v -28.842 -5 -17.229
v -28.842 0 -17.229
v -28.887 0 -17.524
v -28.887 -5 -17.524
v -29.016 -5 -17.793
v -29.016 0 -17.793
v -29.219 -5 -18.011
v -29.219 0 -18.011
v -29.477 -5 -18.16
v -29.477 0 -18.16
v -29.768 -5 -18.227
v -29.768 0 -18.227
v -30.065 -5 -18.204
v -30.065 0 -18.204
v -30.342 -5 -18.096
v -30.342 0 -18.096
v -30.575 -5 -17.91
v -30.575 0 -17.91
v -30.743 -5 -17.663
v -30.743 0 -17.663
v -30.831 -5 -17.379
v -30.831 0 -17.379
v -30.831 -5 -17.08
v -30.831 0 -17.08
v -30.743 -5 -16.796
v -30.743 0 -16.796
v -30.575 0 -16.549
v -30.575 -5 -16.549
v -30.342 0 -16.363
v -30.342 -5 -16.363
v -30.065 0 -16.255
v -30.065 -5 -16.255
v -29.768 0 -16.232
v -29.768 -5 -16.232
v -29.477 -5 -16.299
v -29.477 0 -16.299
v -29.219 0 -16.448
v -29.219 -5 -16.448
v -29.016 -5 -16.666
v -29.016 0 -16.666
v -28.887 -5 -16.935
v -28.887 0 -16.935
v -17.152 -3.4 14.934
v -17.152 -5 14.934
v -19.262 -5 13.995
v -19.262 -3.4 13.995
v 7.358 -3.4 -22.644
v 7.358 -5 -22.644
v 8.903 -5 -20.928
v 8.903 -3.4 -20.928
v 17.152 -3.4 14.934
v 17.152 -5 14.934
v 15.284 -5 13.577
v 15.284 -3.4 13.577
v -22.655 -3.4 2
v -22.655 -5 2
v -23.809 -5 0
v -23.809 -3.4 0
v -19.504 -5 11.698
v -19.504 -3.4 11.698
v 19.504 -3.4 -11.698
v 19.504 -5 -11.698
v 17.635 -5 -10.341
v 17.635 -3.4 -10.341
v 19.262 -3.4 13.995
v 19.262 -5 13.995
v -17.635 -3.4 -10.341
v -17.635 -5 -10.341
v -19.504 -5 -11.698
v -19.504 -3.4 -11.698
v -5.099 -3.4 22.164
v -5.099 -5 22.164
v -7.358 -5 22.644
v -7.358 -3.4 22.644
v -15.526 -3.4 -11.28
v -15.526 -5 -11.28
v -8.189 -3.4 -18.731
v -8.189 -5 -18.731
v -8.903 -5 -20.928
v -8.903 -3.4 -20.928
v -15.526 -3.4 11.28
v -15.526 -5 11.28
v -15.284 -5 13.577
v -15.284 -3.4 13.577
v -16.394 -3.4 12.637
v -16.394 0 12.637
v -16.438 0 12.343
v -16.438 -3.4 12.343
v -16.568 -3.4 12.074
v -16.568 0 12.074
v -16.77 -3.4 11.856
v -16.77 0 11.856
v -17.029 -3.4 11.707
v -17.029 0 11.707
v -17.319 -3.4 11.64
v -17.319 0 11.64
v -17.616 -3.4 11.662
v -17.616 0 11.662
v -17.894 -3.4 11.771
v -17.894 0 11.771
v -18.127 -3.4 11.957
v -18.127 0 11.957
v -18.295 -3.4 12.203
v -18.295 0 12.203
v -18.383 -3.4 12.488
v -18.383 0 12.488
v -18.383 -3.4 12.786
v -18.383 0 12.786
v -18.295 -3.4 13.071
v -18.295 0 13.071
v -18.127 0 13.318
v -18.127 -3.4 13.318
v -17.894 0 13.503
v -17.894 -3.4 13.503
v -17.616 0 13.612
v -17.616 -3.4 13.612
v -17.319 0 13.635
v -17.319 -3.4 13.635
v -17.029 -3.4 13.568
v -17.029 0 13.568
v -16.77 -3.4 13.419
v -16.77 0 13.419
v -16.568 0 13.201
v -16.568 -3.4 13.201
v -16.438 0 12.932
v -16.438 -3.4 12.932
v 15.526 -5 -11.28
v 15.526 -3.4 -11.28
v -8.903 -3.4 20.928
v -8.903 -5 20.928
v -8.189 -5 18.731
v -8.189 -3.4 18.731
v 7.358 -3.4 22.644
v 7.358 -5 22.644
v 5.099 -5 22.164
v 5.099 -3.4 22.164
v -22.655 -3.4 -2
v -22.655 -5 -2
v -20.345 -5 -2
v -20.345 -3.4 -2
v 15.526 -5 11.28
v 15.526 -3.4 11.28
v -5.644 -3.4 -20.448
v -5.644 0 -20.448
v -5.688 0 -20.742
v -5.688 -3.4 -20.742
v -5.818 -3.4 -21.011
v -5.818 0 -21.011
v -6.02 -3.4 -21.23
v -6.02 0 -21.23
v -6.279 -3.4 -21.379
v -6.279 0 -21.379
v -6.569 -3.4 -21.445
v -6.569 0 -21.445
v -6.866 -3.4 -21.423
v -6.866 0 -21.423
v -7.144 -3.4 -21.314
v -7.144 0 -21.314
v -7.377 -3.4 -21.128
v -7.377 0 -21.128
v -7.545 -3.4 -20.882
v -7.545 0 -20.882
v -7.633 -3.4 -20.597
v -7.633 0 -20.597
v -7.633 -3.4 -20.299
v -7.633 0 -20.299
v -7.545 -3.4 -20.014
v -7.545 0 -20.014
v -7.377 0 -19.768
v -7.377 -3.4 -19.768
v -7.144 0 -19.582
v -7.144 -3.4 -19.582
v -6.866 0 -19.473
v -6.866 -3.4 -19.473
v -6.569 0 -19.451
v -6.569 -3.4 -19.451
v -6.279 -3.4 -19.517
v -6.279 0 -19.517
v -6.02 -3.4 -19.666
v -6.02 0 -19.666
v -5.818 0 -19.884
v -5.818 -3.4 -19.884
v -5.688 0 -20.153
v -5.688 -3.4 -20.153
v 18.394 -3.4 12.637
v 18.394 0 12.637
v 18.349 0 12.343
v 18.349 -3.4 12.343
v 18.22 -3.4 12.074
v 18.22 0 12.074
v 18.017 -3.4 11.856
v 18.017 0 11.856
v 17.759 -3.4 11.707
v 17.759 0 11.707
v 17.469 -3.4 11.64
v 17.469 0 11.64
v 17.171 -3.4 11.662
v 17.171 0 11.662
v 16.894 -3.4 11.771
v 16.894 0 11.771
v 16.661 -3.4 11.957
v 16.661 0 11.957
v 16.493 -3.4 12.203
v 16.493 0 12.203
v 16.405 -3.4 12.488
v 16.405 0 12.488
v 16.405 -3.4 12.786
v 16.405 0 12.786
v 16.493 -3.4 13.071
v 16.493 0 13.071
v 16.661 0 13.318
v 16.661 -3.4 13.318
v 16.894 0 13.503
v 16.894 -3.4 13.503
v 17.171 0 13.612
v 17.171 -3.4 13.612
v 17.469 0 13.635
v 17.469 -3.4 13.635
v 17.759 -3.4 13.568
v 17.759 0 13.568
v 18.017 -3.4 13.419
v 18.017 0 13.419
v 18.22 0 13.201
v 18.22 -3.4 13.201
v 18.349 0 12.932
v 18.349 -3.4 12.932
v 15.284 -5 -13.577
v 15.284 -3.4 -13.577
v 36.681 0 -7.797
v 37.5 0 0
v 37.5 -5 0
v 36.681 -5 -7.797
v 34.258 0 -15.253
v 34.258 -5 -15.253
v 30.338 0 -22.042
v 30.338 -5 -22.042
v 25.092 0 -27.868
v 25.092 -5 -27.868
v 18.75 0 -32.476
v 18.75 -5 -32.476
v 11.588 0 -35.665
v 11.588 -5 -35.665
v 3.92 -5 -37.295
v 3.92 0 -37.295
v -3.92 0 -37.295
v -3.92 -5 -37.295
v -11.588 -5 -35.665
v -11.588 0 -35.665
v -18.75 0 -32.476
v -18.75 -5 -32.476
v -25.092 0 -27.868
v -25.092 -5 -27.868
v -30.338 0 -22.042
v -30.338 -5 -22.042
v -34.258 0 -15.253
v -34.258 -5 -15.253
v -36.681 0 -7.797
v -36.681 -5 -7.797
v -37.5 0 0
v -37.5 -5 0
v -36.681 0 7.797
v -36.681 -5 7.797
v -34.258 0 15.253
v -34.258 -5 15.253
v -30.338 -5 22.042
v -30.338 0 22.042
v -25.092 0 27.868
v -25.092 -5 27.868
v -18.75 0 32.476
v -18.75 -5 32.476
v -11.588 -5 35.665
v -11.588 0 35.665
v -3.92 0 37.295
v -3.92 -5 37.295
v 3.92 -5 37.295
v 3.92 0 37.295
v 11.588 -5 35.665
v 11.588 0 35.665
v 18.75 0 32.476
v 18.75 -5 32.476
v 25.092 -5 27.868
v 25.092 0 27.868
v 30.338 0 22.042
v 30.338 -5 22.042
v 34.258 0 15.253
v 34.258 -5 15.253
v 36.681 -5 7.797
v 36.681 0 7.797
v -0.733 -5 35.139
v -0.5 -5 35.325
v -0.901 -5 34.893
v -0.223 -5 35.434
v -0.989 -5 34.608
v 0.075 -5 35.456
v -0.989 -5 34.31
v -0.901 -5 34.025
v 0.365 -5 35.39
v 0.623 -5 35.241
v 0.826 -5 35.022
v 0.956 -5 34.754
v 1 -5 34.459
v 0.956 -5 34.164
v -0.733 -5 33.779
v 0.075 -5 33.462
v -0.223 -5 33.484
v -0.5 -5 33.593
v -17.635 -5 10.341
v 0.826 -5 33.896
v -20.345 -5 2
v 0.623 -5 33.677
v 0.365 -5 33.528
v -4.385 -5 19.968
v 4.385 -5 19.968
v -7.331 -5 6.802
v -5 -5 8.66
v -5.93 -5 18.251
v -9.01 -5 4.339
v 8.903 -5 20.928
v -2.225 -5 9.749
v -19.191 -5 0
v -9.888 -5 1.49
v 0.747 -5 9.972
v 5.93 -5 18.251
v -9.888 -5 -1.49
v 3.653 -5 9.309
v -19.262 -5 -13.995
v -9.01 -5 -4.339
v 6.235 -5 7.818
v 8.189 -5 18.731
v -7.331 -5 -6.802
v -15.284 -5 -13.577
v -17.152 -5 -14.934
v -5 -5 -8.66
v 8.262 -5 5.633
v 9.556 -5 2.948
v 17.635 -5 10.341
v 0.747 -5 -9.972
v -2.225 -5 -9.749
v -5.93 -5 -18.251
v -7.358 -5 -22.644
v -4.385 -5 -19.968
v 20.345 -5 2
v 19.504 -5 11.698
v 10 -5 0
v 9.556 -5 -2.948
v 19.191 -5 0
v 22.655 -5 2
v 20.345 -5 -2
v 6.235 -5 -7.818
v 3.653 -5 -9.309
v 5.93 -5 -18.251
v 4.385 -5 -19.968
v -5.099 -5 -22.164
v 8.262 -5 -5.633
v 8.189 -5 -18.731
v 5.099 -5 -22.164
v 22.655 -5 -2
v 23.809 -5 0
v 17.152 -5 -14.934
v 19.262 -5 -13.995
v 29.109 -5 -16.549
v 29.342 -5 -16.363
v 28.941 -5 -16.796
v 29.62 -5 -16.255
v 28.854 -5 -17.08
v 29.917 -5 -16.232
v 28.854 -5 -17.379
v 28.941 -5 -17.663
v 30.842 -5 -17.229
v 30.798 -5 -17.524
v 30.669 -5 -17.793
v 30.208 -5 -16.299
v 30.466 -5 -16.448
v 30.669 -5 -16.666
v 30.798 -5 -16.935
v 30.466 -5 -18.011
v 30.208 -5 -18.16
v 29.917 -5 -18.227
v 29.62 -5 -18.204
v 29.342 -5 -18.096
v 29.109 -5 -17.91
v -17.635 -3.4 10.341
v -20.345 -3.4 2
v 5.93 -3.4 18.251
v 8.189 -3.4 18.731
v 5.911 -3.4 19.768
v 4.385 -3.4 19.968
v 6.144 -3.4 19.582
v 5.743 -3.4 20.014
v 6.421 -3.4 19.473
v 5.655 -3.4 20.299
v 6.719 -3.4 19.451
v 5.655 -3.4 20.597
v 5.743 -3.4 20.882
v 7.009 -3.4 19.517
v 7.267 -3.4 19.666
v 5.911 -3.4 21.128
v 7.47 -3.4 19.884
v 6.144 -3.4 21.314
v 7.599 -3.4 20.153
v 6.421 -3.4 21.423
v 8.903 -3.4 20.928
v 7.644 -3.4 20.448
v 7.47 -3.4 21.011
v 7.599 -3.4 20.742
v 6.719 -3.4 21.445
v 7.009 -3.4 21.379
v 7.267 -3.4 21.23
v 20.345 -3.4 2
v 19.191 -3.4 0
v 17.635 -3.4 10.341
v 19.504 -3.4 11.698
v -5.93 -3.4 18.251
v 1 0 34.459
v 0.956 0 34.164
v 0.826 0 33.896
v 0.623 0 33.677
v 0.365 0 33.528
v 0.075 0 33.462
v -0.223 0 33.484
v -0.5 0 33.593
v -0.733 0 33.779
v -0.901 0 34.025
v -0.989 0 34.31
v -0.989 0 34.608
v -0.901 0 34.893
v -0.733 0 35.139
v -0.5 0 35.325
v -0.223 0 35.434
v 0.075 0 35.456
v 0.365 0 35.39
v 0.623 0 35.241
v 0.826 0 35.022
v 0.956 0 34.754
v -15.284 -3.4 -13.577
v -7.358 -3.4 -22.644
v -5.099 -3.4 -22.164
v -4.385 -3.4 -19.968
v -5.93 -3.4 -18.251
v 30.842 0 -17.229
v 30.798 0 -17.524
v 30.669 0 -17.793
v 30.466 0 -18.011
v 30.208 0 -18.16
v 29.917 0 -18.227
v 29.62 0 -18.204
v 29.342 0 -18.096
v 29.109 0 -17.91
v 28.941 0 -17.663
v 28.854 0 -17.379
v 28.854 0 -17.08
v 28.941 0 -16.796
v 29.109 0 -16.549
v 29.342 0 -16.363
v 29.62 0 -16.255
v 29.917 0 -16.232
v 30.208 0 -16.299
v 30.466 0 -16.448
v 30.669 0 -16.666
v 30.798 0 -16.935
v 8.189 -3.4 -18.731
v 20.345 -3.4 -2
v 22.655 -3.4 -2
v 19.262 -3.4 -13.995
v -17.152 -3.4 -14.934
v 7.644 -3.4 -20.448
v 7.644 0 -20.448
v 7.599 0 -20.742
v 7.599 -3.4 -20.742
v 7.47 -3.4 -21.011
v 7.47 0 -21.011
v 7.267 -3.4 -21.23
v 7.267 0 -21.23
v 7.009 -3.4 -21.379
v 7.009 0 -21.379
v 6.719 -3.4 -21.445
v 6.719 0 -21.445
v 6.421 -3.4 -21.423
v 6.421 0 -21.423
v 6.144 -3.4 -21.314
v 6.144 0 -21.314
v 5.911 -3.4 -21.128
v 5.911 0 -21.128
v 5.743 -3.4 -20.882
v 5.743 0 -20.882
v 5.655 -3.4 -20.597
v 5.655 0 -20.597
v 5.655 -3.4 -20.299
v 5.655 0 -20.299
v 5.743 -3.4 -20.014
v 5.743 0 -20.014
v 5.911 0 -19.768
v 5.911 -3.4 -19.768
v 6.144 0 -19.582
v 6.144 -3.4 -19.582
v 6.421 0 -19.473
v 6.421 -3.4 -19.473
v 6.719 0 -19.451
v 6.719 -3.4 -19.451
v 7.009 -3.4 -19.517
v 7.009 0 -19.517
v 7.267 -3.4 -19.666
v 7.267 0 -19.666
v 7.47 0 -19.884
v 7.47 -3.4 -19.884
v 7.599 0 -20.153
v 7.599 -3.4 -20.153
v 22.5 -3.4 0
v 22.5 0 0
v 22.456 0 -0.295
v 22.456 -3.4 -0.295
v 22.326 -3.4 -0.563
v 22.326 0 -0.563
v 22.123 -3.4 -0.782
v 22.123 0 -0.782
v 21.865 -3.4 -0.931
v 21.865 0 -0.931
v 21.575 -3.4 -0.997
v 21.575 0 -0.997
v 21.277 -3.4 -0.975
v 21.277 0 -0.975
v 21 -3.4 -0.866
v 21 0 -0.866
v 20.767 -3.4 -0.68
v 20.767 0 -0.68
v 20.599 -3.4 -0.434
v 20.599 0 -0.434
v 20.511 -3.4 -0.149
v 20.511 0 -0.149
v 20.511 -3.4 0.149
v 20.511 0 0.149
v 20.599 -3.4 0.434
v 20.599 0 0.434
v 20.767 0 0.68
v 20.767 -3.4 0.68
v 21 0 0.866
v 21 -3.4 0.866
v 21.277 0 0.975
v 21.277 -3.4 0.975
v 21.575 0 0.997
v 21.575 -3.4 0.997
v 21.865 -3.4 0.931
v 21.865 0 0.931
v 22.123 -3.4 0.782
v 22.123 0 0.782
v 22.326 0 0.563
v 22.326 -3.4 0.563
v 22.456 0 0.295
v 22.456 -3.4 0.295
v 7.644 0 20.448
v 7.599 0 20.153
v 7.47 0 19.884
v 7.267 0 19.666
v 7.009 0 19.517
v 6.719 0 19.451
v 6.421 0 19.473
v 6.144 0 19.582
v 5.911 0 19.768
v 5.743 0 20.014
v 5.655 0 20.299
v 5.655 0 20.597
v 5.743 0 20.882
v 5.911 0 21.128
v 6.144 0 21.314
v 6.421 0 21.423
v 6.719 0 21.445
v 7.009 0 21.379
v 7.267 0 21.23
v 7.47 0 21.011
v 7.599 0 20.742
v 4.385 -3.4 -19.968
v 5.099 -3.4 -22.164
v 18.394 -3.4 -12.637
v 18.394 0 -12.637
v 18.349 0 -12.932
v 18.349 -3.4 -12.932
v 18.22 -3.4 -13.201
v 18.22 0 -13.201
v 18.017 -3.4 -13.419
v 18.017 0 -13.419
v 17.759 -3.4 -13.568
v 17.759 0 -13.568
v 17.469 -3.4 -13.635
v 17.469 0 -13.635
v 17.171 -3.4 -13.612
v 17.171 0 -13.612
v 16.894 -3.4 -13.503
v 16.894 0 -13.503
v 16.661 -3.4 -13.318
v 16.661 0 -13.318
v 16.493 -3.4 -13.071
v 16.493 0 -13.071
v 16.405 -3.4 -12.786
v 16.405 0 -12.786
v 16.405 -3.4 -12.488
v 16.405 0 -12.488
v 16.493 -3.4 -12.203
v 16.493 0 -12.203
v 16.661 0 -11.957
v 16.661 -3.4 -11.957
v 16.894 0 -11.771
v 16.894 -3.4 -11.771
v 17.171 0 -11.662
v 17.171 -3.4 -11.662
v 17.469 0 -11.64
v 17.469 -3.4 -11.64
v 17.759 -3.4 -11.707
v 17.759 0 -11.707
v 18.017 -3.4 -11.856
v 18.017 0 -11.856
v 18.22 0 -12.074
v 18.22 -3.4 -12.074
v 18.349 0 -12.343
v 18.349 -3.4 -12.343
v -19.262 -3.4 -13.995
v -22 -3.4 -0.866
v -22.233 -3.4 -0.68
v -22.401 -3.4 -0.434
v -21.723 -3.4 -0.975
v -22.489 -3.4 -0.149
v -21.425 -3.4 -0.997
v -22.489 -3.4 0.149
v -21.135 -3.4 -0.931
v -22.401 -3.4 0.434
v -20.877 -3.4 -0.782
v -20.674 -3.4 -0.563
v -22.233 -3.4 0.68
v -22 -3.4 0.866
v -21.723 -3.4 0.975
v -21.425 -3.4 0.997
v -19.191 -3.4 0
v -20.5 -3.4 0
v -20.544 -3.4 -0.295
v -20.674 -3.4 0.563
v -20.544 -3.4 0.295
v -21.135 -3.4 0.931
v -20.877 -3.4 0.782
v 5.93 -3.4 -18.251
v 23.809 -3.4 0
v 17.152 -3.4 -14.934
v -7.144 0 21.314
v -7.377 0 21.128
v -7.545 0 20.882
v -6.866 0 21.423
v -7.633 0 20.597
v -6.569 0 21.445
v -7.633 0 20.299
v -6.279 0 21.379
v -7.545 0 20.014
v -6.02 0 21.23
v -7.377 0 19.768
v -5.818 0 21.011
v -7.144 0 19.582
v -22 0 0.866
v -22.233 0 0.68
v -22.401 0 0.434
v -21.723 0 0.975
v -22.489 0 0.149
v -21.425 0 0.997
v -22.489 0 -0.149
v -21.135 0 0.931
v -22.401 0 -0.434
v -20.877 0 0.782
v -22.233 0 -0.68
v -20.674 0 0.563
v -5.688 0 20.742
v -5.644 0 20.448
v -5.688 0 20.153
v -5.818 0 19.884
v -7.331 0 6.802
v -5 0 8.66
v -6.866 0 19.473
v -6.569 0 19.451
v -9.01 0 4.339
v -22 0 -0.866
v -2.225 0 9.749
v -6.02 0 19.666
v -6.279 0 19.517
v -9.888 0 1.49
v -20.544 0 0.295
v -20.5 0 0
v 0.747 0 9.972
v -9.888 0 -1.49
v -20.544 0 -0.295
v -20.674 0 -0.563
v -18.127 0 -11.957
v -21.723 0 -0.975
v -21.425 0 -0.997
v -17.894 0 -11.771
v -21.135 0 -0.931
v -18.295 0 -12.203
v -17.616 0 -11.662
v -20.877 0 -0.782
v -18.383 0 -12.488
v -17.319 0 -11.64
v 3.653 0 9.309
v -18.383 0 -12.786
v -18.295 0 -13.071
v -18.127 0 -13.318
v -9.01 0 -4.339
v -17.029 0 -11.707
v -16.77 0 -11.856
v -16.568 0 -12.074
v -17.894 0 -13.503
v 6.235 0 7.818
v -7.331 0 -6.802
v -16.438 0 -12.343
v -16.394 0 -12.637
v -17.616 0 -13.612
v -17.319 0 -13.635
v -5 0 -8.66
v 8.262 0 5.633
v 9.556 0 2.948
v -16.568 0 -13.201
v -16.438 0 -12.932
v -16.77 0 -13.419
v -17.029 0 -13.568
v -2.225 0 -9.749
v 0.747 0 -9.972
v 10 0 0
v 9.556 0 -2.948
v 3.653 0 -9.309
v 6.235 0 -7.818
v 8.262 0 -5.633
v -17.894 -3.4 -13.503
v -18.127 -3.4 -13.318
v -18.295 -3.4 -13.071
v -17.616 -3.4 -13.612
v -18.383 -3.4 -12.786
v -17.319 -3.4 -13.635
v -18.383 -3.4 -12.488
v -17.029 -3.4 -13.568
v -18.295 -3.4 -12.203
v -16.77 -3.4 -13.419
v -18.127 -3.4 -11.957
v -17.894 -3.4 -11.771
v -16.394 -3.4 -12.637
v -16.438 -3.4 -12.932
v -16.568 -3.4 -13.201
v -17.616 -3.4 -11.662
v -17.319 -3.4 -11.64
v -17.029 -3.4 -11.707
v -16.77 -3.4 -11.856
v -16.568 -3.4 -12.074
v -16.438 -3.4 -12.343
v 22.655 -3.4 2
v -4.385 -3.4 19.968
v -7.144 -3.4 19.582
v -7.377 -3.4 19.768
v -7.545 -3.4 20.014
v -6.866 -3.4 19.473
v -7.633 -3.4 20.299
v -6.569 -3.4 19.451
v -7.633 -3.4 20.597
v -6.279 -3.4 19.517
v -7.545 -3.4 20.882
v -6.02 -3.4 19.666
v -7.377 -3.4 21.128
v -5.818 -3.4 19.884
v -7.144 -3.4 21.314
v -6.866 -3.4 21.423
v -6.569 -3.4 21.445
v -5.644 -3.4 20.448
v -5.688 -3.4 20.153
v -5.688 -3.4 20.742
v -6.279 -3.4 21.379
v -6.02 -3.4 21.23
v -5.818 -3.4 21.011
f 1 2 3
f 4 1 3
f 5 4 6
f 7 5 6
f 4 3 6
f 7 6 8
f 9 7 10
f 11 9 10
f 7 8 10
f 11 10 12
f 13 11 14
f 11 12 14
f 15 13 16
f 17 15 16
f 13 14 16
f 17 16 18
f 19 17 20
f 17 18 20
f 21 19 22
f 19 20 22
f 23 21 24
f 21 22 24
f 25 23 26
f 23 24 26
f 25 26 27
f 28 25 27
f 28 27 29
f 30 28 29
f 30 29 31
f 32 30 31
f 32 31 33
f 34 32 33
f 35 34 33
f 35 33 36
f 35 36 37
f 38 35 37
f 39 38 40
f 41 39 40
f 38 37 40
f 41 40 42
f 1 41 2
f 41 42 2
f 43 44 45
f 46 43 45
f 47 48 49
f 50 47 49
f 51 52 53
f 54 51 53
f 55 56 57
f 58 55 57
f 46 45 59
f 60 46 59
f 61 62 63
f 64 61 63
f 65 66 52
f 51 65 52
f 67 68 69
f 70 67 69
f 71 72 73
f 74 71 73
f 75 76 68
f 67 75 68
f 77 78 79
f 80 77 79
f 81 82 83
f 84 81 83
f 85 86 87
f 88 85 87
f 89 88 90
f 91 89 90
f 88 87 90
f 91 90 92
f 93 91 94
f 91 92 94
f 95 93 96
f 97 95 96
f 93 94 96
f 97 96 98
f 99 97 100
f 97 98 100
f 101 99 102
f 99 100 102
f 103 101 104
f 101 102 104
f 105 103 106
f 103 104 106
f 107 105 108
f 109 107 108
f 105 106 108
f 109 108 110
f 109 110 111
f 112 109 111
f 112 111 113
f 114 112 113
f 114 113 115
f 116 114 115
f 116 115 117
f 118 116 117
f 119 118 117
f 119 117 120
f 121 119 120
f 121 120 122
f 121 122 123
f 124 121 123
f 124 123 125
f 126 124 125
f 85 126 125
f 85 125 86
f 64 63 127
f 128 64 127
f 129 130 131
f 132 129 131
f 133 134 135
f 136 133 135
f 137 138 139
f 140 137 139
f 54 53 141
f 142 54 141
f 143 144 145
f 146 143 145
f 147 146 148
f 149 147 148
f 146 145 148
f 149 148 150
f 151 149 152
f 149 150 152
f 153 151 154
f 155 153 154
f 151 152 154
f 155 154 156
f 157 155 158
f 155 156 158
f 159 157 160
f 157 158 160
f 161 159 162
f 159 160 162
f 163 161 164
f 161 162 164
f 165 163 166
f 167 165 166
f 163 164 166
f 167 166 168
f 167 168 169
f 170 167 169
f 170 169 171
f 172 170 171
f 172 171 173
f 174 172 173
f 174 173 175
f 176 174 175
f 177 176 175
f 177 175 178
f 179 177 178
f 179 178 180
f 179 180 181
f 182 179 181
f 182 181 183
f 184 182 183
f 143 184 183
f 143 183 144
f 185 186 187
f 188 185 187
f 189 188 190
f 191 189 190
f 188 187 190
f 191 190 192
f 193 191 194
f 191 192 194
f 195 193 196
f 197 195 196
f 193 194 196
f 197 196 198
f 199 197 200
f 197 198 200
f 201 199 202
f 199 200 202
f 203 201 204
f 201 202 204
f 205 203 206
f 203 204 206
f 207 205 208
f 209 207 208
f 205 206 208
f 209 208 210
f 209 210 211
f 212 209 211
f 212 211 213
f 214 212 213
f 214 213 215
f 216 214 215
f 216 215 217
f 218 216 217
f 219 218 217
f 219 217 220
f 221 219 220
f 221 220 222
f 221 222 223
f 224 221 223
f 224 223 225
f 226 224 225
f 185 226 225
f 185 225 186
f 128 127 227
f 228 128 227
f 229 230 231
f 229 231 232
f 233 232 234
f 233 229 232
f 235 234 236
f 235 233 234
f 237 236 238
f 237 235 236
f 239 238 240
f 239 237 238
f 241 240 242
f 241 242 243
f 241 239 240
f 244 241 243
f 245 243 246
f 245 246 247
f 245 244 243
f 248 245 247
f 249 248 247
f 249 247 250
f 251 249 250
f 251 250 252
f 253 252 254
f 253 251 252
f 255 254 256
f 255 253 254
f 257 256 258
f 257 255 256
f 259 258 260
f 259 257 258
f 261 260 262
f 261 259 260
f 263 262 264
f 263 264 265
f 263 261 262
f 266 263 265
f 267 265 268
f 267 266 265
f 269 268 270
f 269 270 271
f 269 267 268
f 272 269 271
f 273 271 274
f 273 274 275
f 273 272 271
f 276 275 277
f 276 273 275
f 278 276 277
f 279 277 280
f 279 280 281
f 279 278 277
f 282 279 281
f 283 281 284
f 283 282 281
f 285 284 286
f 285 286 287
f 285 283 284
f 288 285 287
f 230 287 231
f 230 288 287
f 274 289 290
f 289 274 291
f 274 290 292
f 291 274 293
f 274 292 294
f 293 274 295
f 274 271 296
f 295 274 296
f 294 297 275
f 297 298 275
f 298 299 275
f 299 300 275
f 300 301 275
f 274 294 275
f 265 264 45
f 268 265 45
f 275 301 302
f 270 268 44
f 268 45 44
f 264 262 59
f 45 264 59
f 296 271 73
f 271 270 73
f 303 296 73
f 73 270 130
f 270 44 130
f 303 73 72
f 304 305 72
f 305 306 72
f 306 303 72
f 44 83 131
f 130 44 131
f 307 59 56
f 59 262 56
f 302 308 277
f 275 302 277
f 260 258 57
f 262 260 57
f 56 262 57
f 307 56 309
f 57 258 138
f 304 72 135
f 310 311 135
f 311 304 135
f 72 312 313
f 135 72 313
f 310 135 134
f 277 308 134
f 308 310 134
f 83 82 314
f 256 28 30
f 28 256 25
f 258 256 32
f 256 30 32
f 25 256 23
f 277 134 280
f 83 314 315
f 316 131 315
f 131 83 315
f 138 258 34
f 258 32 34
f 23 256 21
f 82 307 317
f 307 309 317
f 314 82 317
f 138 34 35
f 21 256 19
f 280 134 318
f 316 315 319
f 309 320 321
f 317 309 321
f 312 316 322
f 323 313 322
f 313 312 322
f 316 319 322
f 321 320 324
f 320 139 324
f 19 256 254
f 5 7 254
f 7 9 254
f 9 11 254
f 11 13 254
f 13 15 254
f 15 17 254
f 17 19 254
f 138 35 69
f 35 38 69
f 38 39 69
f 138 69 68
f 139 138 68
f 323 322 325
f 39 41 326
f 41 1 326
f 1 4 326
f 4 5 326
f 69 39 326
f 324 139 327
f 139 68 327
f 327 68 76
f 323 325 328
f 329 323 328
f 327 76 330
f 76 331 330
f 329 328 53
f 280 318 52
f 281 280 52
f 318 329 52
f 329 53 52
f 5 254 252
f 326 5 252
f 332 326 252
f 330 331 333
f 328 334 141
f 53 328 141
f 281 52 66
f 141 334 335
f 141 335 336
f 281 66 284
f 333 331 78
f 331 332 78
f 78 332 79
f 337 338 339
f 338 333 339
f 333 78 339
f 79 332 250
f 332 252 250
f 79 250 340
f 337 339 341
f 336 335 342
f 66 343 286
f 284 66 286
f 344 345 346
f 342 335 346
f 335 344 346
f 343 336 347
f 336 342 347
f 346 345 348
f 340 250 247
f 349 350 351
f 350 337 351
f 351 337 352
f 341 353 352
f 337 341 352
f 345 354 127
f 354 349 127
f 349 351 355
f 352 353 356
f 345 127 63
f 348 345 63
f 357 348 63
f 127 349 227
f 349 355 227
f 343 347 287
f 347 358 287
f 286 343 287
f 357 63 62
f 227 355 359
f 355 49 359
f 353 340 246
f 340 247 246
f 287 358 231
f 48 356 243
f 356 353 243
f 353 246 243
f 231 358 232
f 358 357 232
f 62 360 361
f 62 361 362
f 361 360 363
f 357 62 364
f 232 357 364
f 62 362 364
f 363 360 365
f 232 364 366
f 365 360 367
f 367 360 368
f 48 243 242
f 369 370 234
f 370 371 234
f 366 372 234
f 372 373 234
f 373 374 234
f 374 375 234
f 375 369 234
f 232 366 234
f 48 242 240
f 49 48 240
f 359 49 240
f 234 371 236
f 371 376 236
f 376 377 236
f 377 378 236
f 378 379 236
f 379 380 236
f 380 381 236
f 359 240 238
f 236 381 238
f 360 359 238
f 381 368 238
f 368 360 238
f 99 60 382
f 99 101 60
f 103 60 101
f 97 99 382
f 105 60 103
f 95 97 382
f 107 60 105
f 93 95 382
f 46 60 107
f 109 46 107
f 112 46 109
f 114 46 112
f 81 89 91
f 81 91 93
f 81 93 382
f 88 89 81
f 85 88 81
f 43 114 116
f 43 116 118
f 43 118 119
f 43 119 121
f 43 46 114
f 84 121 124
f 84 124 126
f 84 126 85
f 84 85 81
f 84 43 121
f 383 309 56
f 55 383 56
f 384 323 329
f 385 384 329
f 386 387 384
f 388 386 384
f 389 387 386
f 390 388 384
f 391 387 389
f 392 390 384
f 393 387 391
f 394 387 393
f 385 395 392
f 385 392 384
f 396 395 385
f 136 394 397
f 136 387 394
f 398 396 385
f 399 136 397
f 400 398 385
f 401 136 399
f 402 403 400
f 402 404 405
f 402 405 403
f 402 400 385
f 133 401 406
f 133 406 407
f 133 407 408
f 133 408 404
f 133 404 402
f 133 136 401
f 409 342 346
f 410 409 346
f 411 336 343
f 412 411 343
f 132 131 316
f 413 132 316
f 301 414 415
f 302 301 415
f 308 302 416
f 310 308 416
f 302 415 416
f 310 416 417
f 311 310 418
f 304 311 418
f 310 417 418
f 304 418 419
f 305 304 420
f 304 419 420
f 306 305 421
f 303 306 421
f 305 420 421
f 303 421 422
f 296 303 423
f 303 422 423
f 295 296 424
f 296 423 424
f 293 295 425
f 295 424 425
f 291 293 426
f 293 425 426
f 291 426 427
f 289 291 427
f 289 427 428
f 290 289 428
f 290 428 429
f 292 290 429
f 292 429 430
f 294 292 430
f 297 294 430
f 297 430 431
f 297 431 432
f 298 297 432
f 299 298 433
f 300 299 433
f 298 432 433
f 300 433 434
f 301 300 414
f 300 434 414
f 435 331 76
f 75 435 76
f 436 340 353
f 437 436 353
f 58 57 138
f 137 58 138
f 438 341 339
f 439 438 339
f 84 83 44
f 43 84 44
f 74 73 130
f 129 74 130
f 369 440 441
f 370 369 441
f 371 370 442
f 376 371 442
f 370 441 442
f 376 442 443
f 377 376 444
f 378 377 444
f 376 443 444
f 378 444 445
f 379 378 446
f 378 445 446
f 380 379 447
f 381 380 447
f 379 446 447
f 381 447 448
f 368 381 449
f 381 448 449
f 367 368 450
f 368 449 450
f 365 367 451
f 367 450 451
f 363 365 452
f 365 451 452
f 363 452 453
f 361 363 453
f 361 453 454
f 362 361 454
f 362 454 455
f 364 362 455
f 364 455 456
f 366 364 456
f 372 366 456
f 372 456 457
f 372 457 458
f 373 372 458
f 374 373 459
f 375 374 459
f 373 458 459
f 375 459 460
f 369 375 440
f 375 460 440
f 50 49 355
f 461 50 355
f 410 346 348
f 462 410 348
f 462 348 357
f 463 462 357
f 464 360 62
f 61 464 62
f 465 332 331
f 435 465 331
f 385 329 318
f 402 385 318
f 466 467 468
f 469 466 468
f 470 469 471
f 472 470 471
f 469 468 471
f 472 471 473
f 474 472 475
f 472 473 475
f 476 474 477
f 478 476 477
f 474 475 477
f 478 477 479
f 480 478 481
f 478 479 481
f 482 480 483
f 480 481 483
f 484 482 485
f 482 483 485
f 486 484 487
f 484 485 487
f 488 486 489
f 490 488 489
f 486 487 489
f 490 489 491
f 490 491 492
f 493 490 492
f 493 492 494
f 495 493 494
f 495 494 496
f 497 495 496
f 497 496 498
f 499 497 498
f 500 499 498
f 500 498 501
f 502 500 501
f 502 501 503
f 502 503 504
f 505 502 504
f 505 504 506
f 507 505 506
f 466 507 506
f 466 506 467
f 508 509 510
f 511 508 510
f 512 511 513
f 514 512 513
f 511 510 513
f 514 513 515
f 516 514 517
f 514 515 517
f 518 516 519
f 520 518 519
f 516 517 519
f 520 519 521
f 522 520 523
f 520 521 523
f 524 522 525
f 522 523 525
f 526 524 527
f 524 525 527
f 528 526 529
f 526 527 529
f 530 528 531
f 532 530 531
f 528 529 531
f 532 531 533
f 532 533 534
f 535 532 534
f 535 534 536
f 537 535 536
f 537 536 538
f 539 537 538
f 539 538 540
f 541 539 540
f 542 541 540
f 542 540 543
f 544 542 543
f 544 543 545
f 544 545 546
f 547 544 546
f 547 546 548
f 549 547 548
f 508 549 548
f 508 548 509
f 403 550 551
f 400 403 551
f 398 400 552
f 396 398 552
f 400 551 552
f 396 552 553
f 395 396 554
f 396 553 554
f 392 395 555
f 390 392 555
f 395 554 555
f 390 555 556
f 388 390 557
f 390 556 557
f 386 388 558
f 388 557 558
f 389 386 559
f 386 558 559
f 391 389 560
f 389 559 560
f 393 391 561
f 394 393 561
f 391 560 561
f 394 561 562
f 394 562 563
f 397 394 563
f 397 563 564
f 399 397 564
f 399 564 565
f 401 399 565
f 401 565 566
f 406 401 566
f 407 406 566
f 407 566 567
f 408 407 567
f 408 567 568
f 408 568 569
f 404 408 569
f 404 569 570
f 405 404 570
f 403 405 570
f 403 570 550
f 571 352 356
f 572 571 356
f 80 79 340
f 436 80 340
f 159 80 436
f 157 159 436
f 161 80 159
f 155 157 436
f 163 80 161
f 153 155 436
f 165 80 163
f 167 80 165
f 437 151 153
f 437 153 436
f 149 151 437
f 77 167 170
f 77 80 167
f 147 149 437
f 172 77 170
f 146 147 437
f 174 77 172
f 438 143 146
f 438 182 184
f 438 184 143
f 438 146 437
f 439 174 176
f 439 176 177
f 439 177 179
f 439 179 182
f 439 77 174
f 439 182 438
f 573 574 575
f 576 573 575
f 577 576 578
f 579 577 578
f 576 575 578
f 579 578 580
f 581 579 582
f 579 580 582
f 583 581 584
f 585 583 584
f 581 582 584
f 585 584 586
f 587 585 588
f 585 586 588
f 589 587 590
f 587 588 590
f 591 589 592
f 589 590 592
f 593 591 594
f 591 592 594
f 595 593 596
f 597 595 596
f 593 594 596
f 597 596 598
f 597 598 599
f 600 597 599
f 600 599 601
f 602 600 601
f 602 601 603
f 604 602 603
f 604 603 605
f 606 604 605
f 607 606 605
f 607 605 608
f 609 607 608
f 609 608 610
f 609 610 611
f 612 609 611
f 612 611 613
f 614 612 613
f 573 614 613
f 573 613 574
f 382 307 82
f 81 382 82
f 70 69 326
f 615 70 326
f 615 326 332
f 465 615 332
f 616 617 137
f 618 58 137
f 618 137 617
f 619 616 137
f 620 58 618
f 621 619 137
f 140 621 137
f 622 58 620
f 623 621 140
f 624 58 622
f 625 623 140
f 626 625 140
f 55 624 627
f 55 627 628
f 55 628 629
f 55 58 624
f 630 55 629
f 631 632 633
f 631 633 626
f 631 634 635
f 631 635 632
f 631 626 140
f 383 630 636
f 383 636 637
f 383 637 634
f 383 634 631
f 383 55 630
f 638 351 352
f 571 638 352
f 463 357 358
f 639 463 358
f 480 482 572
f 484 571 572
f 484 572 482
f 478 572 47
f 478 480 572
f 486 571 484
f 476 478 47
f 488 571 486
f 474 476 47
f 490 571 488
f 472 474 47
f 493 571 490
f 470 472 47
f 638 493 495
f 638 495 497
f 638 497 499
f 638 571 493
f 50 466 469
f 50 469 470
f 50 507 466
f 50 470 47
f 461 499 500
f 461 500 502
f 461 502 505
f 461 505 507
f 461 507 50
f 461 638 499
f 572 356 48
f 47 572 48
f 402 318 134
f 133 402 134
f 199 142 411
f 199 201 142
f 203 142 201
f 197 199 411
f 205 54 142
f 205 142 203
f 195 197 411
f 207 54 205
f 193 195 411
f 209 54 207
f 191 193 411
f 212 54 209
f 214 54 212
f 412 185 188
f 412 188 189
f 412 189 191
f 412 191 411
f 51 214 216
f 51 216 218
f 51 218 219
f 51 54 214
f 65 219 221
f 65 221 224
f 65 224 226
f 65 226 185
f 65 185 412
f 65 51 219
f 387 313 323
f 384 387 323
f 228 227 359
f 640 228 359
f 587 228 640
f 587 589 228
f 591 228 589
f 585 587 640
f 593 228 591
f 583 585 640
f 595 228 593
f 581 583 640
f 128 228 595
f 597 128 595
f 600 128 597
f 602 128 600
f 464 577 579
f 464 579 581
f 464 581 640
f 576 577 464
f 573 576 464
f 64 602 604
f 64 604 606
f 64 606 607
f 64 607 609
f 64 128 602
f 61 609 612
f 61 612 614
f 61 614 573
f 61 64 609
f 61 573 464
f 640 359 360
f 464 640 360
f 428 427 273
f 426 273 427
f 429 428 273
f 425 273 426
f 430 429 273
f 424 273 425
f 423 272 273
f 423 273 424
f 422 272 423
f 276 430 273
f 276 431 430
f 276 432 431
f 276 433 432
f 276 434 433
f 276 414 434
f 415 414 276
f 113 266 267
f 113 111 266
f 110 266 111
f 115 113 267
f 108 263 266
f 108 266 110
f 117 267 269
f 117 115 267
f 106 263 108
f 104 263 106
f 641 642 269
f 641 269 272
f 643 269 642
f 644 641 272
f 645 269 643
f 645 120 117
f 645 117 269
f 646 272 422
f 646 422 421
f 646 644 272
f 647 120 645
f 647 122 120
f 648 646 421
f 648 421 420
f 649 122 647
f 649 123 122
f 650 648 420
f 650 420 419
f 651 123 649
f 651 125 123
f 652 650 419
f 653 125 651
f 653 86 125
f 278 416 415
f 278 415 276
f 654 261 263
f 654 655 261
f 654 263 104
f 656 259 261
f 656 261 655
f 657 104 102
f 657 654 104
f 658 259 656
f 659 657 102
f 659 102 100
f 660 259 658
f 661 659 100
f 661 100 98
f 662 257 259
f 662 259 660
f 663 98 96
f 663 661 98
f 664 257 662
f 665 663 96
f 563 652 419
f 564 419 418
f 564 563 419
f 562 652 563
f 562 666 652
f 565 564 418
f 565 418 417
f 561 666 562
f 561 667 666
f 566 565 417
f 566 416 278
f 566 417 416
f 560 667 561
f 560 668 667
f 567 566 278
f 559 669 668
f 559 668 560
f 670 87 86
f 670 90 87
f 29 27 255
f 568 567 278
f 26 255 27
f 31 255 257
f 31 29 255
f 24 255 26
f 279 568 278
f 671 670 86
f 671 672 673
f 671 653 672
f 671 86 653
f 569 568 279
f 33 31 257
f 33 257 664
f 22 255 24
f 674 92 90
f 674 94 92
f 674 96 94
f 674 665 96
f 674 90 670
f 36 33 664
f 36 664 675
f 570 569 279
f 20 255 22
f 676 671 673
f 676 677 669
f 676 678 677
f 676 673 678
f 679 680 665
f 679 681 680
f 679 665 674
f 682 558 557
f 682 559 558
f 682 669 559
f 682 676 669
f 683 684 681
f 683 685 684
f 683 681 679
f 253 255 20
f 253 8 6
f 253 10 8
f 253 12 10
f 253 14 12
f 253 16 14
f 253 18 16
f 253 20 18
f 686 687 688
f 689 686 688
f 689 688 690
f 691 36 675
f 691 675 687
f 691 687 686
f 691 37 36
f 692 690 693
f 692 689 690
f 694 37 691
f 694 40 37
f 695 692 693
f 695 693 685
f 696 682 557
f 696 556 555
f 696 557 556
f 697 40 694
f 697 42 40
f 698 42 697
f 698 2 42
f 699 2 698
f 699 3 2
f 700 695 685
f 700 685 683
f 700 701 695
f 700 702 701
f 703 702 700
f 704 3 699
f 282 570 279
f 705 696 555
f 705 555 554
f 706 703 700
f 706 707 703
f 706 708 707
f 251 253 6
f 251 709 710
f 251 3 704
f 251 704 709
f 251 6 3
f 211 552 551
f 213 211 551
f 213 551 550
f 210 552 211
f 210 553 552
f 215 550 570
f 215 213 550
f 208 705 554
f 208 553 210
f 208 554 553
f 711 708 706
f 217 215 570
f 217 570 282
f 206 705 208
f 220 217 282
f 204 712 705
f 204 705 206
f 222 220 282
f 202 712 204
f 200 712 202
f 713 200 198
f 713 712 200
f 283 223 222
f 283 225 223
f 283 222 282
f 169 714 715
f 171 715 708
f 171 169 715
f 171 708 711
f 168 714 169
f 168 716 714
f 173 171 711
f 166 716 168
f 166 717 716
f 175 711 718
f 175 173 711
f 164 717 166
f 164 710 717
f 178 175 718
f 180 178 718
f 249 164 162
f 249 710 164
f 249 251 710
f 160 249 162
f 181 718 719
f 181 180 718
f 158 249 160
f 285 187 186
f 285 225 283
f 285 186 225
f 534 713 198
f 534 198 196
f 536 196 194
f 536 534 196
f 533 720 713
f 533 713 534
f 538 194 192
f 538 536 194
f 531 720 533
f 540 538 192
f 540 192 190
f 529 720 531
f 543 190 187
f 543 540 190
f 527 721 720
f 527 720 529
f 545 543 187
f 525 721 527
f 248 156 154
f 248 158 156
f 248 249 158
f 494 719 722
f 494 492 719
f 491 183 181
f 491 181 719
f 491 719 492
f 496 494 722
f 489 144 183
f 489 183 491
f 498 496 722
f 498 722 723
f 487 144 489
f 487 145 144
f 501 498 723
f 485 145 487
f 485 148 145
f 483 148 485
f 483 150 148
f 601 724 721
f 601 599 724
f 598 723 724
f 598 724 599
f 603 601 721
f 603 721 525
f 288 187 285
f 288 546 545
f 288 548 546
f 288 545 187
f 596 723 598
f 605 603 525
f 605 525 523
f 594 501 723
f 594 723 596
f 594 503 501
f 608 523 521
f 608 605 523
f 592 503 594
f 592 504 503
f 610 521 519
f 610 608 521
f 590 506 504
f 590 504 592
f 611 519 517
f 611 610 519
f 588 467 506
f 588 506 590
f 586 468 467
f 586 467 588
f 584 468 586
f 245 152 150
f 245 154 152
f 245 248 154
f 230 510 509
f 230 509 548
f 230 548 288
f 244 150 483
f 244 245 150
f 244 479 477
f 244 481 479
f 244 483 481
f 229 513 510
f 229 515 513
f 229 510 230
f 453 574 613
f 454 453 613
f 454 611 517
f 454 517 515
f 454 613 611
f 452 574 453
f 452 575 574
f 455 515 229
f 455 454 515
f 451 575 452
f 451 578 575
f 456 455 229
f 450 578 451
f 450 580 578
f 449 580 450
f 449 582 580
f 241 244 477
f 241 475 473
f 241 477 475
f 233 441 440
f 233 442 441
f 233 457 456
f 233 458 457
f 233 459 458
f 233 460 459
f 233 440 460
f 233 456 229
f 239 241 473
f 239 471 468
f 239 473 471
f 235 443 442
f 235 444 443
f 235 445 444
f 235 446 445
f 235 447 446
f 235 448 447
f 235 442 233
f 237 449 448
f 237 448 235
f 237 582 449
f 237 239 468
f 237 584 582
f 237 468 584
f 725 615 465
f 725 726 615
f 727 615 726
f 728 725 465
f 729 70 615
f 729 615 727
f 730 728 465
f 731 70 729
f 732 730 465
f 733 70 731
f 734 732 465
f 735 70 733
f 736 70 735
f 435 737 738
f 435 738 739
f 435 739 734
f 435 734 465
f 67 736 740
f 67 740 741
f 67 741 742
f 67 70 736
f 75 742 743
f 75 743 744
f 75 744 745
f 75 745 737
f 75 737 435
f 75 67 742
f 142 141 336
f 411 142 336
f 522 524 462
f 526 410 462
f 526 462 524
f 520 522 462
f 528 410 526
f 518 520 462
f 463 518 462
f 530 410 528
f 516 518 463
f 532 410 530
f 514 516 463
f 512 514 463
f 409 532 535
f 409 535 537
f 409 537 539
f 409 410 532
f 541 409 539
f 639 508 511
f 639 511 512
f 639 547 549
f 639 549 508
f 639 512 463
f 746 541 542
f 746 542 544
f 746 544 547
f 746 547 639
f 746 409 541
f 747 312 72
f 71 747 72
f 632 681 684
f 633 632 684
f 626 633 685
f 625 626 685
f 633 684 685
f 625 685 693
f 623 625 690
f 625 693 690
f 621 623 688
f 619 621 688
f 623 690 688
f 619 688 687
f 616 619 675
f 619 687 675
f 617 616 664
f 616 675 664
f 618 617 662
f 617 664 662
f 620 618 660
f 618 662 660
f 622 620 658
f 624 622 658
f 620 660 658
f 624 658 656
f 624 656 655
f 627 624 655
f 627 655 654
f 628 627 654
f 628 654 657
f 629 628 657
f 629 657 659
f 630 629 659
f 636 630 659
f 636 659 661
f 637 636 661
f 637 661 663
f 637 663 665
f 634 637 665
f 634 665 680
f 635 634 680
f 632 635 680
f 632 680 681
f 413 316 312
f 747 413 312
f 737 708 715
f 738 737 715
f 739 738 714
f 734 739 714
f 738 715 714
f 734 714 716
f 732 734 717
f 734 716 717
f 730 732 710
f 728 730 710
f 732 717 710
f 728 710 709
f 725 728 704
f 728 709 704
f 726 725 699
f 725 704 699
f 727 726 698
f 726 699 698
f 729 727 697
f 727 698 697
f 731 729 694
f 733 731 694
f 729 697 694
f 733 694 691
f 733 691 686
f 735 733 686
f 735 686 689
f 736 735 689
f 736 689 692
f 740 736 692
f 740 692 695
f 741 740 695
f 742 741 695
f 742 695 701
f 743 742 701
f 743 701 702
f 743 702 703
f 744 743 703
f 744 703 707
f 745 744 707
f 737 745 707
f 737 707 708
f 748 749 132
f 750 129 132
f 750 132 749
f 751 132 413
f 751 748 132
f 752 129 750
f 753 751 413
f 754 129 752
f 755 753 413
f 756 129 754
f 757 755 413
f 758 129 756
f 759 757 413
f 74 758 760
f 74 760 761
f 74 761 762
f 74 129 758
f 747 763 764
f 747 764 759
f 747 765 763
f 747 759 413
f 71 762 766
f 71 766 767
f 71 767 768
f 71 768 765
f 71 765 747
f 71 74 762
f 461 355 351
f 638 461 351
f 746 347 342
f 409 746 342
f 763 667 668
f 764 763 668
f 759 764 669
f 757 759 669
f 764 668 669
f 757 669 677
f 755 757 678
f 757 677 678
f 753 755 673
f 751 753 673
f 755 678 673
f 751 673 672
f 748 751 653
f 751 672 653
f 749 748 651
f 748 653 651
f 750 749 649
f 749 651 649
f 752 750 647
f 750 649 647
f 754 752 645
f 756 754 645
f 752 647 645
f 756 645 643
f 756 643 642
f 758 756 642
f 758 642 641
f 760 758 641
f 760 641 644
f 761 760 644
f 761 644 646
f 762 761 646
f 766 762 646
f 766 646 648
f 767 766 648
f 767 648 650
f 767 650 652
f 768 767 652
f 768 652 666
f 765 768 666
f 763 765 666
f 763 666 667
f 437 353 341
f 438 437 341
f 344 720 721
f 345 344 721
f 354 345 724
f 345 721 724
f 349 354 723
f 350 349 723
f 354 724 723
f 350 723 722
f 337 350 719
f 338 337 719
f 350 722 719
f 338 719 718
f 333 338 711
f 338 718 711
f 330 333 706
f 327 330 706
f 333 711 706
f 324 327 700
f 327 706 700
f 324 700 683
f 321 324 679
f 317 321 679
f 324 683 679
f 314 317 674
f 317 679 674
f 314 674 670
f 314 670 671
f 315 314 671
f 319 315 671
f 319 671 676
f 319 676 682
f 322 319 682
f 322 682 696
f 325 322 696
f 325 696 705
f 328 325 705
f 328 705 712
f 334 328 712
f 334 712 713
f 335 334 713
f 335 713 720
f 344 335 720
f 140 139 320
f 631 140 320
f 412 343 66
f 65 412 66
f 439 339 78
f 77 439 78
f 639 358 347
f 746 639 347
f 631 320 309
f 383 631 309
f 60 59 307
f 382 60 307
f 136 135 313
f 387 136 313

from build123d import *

# Parameters (mm, degrees)
SKETCH1_R           = 37.5
BOSS_EXTRUDE1_DEPTH = 5
CUT_EXTRUDE1_REACH  = 7
SKETCH2_R           = 1
CUT_EXTRUDE2_DEPTH  = 1.6
CUT_EXTRUDE3_REACH  = 7
SKETCH6_R           = 10
SKETCH7_R           = 1
CUT_EXTRUDE4_DEPTH  = 5


with BuildPart() as part:
    # Sketch1 → Boss-Extrude1 (new body)
    with BuildSketch(Plane(origin=(0, 0, 0), x_dir=(1, 0, 0), z_dir=(0, 1, 0))):
        Circle(SKETCH1_R)
    extrude(amount=-BOSS_EXTRUDE1_DEPTH)

    # Sketch2 → Cut-Extrude1 (cut, up to next)
    with BuildSketch(Plane(origin=(0, 0, 0), x_dir=(1, 0, 0), z_dir=(0, 1, 0)), mode=Mode.PRIVATE) as cut_extrude1_sk1:
        with Locations((-21.5, 0)):
            Circle(SKETCH2_R)
    cut_extrude1_tool1 = extrude(cut_extrude1_sk1.sketch, amount=-CUT_EXTRUDE1_REACH, mode=Mode.PRIVATE) & part.part
    add(cut_extrude1_tool1.solids().sort_by_distance((-21.5, 0, 0))[0], mode=Mode.SUBTRACT)
    # Sketch2 → Cut-Extrude1 (cut, up to next)
    with BuildSketch(Plane(origin=(0, 0, 0), x_dir=(1, 0, 0), z_dir=(0, 1, 0)), mode=Mode.PRIVATE) as cut_extrude1_sk2:
        with Locations((-17.393865379, 12.637382924)):
            Circle(SKETCH2_R)
    cut_extrude1_tool2 = extrude(cut_extrude1_sk2.sketch, amount=-CUT_EXTRUDE1_REACH, mode=Mode.PRIVATE) & part.part
    add(cut_extrude1_tool2.solids().sort_by_distance((-17.393865, 0, -12.637383))[0], mode=Mode.SUBTRACT)
    # Sketch2 → Cut-Extrude1 (cut, up to next)
    with BuildSketch(Plane(origin=(0, 0, 0), x_dir=(1, 0, 0), z_dir=(0, 1, 0)), mode=Mode.PRIVATE) as cut_extrude1_sk3:
        with Locations((-6.643865379, 20.4477151)):
            Circle(SKETCH2_R)
    cut_extrude1_tool3 = extrude(cut_extrude1_sk3.sketch, amount=-CUT_EXTRUDE1_REACH, mode=Mode.PRIVATE) & part.part
    add(cut_extrude1_tool3.solids().sort_by_distance((-6.643865, 0, -20.447715))[0], mode=Mode.SUBTRACT)
    # Sketch2 → Cut-Extrude1 (cut, up to next)
    with BuildSketch(Plane(origin=(0, 0, 0), x_dir=(1, 0, 0), z_dir=(0, 1, 0)), mode=Mode.PRIVATE) as cut_extrude1_sk4:
        with Locations((6.643865379, 20.4477151)):
            Circle(SKETCH2_R)
    cut_extrude1_tool4 = extrude(cut_extrude1_sk4.sketch, amount=-CUT_EXTRUDE1_REACH, mode=Mode.PRIVATE) & part.part
    add(cut_extrude1_tool4.solids().sort_by_distance((6.643865, 0, -20.447715))[0], mode=Mode.SUBTRACT)
    # Sketch2 → Cut-Extrude1 (cut, up to next)
    with BuildSketch(Plane(origin=(0, 0, 0), x_dir=(1, 0, 0), z_dir=(0, 1, 0)), mode=Mode.PRIVATE) as cut_extrude1_sk5:
        with Locations((17.393865379, 12.637382924)):
            Circle(SKETCH2_R)
    cut_extrude1_tool5 = extrude(cut_extrude1_sk5.sketch, amount=-CUT_EXTRUDE1_REACH, mode=Mode.PRIVATE) & part.part
    add(cut_extrude1_tool5.solids().sort_by_distance((17.393865, 0, -12.637383))[0], mode=Mode.SUBTRACT)
    # Sketch2 → Cut-Extrude1 (cut, up to next)
    with BuildSketch(Plane(origin=(0, 0, 0), x_dir=(1, 0, 0), z_dir=(0, 1, 0)), mode=Mode.PRIVATE) as cut_extrude1_sk6:
        with Locations((21.5, 0)):
            Circle(SKETCH2_R)
    cut_extrude1_tool6 = extrude(cut_extrude1_sk6.sketch, amount=-CUT_EXTRUDE1_REACH, mode=Mode.PRIVATE) & part.part
    add(cut_extrude1_tool6.solids().sort_by_distance((21.5, 0, 0))[0], mode=Mode.SUBTRACT)
    # Sketch2 → Cut-Extrude1 (cut, up to next)
    with BuildSketch(Plane(origin=(0, 0, 0), x_dir=(1, 0, 0), z_dir=(0, 1, 0)), mode=Mode.PRIVATE) as cut_extrude1_sk7:
        with Locations((17.393865379, -12.637382924)):
            Circle(SKETCH2_R)
    cut_extrude1_tool7 = extrude(cut_extrude1_sk7.sketch, amount=-CUT_EXTRUDE1_REACH, mode=Mode.PRIVATE) & part.part
    add(cut_extrude1_tool7.solids().sort_by_distance((17.393865, 0, 12.637383))[0], mode=Mode.SUBTRACT)
    # Sketch2 → Cut-Extrude1 (cut, up to next)
    with BuildSketch(Plane(origin=(0, 0, 0), x_dir=(1, 0, 0), z_dir=(0, 1, 0)), mode=Mode.PRIVATE) as cut_extrude1_sk8:
        with Locations((6.643865379, -20.4477151)):
            Circle(SKETCH2_R)
    cut_extrude1_tool8 = extrude(cut_extrude1_sk8.sketch, amount=-CUT_EXTRUDE1_REACH, mode=Mode.PRIVATE) & part.part
    add(cut_extrude1_tool8.solids().sort_by_distance((6.643865, 0, 20.447715))[0], mode=Mode.SUBTRACT)
    # Sketch2 → Cut-Extrude1 (cut, up to next)
    with BuildSketch(Plane(origin=(0, 0, 0), x_dir=(1, 0, 0), z_dir=(0, 1, 0)), mode=Mode.PRIVATE) as cut_extrude1_sk9:
        with Locations((-6.643865379, -20.4477151)):
            Circle(SKETCH2_R)
    cut_extrude1_tool9 = extrude(cut_extrude1_sk9.sketch, amount=-CUT_EXTRUDE1_REACH, mode=Mode.PRIVATE) & part.part
    add(cut_extrude1_tool9.solids().sort_by_distance((-6.643865, 0, 20.447715))[0], mode=Mode.SUBTRACT)
    # Sketch2 → Cut-Extrude1 (cut, up to next)
    with BuildSketch(Plane(origin=(0, 0, 0), x_dir=(1, 0, 0), z_dir=(0, 1, 0)), mode=Mode.PRIVATE) as cut_extrude1_sk10:
        with Locations((-17.393865379, -12.637382924)):
            Circle(SKETCH2_R)
    cut_extrude1_tool10 = extrude(cut_extrude1_sk10.sketch, amount=-CUT_EXTRUDE1_REACH, mode=Mode.PRIVATE) & part.part
    add(cut_extrude1_tool10.solids().sort_by_distance((-17.393865, 0, 12.637383))[0], mode=Mode.SUBTRACT)

    # Sketch4 → Cut-Extrude2 (cut)
    with BuildSketch(Plane.XZ.offset(5)):
        Polygon((-15.525520661, 11.27995103), (-15.284122516, 13.576700966), (-17.152467233, 14.93413286), (-19.262210097, 13.994814819), (-19.503608243, 11.698064883), (-17.635263525, 10.340632988), align=None)
        Polygon((-19.190598923, 0), (-20.345299462, 2), (-22.654700538, 2), (-23.809401077, 0), (-22.654700538, -2), (-20.345299462, -2), align=None)
        Polygon((-5.9302212, 18.251344158), (-4.384930257, 19.967563618), (-5.098574436, 22.16393456), (-7.357509559, 22.644086043), (-8.902800501, 20.927866583), (-8.189156322, 18.73149564), align=None)
        Polygon((5.9302212, 18.251344158), (8.189156322, 18.73149564), (8.902800501, 20.927866583), (7.357509559, 22.644086043), (5.098574436, 22.16393456), (4.384930257, 19.967563618), align=None)
        Polygon((15.525520661, 11.27995103), (17.635263525, 10.340632988), (19.503608243, 11.698064883), (19.262210097, 13.994814819), (17.152467233, 14.93413286), (15.284122516, 13.576700966), align=None)
        Polygon((19.190598923, 0), (20.345299462, -2), (22.654700538, -2), (23.809401077, 0), (22.654700538, 2), (20.345299462, 2), align=None)
        Polygon((15.525520661, -11.27995103), (15.284122516, -13.576700966), (17.152467233, -14.93413286), (19.262210097, -13.994814819), (19.503608243, -11.698064883), (17.635263525, -10.340632988), align=None)
        Polygon((5.9302212, -18.251344158), (4.384930257, -19.967563618), (5.098574436, -22.16393456), (7.357509559, -22.644086043), (8.902800501, -20.927866583), (8.189156322, -18.73149564), align=None)
        Polygon((-5.9302212, -18.251344158), (-8.189156322, -18.73149564), (-8.902800501, -20.927866583), (-7.357509559, -22.644086043), (-5.098574436, -22.16393456), (-4.384930257, -19.967563618), align=None)
        Polygon((-15.525520661, -11.27995103), (-17.635263525, -10.340632988), (-19.503608243, -11.698064883), (-19.262210097, -13.994814819), (-17.152467233, -14.93413286), (-15.284122516, -13.576700966), align=None)
    extrude(amount=-CUT_EXTRUDE2_DEPTH, mode=Mode.SUBTRACT)

    # Sketch6 → Cut-Extrude3 (cut, up to next)
    with BuildSketch(Plane(origin=(0, 0, 0), x_dir=(1, 0, 0), z_dir=(0, 1, 0)), mode=Mode.PRIVATE) as cut_extrude3_sk1:
        Circle(SKETCH6_R)
    cut_extrude3_tool1 = extrude(cut_extrude3_sk1.sketch, amount=-CUT_EXTRUDE3_REACH, mode=Mode.PRIVATE) & part.part
    add(cut_extrude3_tool1.solids().sort_by_distance((0, 0, 0))[0], mode=Mode.SUBTRACT)

    # Sketch7 → Cut-Extrude4 (cut)
    with BuildSketch(Plane(origin=(0, 0, 0), x_dir=(1, 0, 0), z_dir=(0, 1, 0))):
        with Locations((0, -34.458998708)):
            Circle(SKETCH7_R)
        with Locations((-29.84236827, 17.229499354)):
            Circle(SKETCH7_R)
        with Locations((29.84236827, 17.229499354)):
            Circle(SKETCH7_R)
    extrude(amount=-CUT_EXTRUDE4_DEPTH, mode=Mode.SUBTRACT)


solid = part.part
